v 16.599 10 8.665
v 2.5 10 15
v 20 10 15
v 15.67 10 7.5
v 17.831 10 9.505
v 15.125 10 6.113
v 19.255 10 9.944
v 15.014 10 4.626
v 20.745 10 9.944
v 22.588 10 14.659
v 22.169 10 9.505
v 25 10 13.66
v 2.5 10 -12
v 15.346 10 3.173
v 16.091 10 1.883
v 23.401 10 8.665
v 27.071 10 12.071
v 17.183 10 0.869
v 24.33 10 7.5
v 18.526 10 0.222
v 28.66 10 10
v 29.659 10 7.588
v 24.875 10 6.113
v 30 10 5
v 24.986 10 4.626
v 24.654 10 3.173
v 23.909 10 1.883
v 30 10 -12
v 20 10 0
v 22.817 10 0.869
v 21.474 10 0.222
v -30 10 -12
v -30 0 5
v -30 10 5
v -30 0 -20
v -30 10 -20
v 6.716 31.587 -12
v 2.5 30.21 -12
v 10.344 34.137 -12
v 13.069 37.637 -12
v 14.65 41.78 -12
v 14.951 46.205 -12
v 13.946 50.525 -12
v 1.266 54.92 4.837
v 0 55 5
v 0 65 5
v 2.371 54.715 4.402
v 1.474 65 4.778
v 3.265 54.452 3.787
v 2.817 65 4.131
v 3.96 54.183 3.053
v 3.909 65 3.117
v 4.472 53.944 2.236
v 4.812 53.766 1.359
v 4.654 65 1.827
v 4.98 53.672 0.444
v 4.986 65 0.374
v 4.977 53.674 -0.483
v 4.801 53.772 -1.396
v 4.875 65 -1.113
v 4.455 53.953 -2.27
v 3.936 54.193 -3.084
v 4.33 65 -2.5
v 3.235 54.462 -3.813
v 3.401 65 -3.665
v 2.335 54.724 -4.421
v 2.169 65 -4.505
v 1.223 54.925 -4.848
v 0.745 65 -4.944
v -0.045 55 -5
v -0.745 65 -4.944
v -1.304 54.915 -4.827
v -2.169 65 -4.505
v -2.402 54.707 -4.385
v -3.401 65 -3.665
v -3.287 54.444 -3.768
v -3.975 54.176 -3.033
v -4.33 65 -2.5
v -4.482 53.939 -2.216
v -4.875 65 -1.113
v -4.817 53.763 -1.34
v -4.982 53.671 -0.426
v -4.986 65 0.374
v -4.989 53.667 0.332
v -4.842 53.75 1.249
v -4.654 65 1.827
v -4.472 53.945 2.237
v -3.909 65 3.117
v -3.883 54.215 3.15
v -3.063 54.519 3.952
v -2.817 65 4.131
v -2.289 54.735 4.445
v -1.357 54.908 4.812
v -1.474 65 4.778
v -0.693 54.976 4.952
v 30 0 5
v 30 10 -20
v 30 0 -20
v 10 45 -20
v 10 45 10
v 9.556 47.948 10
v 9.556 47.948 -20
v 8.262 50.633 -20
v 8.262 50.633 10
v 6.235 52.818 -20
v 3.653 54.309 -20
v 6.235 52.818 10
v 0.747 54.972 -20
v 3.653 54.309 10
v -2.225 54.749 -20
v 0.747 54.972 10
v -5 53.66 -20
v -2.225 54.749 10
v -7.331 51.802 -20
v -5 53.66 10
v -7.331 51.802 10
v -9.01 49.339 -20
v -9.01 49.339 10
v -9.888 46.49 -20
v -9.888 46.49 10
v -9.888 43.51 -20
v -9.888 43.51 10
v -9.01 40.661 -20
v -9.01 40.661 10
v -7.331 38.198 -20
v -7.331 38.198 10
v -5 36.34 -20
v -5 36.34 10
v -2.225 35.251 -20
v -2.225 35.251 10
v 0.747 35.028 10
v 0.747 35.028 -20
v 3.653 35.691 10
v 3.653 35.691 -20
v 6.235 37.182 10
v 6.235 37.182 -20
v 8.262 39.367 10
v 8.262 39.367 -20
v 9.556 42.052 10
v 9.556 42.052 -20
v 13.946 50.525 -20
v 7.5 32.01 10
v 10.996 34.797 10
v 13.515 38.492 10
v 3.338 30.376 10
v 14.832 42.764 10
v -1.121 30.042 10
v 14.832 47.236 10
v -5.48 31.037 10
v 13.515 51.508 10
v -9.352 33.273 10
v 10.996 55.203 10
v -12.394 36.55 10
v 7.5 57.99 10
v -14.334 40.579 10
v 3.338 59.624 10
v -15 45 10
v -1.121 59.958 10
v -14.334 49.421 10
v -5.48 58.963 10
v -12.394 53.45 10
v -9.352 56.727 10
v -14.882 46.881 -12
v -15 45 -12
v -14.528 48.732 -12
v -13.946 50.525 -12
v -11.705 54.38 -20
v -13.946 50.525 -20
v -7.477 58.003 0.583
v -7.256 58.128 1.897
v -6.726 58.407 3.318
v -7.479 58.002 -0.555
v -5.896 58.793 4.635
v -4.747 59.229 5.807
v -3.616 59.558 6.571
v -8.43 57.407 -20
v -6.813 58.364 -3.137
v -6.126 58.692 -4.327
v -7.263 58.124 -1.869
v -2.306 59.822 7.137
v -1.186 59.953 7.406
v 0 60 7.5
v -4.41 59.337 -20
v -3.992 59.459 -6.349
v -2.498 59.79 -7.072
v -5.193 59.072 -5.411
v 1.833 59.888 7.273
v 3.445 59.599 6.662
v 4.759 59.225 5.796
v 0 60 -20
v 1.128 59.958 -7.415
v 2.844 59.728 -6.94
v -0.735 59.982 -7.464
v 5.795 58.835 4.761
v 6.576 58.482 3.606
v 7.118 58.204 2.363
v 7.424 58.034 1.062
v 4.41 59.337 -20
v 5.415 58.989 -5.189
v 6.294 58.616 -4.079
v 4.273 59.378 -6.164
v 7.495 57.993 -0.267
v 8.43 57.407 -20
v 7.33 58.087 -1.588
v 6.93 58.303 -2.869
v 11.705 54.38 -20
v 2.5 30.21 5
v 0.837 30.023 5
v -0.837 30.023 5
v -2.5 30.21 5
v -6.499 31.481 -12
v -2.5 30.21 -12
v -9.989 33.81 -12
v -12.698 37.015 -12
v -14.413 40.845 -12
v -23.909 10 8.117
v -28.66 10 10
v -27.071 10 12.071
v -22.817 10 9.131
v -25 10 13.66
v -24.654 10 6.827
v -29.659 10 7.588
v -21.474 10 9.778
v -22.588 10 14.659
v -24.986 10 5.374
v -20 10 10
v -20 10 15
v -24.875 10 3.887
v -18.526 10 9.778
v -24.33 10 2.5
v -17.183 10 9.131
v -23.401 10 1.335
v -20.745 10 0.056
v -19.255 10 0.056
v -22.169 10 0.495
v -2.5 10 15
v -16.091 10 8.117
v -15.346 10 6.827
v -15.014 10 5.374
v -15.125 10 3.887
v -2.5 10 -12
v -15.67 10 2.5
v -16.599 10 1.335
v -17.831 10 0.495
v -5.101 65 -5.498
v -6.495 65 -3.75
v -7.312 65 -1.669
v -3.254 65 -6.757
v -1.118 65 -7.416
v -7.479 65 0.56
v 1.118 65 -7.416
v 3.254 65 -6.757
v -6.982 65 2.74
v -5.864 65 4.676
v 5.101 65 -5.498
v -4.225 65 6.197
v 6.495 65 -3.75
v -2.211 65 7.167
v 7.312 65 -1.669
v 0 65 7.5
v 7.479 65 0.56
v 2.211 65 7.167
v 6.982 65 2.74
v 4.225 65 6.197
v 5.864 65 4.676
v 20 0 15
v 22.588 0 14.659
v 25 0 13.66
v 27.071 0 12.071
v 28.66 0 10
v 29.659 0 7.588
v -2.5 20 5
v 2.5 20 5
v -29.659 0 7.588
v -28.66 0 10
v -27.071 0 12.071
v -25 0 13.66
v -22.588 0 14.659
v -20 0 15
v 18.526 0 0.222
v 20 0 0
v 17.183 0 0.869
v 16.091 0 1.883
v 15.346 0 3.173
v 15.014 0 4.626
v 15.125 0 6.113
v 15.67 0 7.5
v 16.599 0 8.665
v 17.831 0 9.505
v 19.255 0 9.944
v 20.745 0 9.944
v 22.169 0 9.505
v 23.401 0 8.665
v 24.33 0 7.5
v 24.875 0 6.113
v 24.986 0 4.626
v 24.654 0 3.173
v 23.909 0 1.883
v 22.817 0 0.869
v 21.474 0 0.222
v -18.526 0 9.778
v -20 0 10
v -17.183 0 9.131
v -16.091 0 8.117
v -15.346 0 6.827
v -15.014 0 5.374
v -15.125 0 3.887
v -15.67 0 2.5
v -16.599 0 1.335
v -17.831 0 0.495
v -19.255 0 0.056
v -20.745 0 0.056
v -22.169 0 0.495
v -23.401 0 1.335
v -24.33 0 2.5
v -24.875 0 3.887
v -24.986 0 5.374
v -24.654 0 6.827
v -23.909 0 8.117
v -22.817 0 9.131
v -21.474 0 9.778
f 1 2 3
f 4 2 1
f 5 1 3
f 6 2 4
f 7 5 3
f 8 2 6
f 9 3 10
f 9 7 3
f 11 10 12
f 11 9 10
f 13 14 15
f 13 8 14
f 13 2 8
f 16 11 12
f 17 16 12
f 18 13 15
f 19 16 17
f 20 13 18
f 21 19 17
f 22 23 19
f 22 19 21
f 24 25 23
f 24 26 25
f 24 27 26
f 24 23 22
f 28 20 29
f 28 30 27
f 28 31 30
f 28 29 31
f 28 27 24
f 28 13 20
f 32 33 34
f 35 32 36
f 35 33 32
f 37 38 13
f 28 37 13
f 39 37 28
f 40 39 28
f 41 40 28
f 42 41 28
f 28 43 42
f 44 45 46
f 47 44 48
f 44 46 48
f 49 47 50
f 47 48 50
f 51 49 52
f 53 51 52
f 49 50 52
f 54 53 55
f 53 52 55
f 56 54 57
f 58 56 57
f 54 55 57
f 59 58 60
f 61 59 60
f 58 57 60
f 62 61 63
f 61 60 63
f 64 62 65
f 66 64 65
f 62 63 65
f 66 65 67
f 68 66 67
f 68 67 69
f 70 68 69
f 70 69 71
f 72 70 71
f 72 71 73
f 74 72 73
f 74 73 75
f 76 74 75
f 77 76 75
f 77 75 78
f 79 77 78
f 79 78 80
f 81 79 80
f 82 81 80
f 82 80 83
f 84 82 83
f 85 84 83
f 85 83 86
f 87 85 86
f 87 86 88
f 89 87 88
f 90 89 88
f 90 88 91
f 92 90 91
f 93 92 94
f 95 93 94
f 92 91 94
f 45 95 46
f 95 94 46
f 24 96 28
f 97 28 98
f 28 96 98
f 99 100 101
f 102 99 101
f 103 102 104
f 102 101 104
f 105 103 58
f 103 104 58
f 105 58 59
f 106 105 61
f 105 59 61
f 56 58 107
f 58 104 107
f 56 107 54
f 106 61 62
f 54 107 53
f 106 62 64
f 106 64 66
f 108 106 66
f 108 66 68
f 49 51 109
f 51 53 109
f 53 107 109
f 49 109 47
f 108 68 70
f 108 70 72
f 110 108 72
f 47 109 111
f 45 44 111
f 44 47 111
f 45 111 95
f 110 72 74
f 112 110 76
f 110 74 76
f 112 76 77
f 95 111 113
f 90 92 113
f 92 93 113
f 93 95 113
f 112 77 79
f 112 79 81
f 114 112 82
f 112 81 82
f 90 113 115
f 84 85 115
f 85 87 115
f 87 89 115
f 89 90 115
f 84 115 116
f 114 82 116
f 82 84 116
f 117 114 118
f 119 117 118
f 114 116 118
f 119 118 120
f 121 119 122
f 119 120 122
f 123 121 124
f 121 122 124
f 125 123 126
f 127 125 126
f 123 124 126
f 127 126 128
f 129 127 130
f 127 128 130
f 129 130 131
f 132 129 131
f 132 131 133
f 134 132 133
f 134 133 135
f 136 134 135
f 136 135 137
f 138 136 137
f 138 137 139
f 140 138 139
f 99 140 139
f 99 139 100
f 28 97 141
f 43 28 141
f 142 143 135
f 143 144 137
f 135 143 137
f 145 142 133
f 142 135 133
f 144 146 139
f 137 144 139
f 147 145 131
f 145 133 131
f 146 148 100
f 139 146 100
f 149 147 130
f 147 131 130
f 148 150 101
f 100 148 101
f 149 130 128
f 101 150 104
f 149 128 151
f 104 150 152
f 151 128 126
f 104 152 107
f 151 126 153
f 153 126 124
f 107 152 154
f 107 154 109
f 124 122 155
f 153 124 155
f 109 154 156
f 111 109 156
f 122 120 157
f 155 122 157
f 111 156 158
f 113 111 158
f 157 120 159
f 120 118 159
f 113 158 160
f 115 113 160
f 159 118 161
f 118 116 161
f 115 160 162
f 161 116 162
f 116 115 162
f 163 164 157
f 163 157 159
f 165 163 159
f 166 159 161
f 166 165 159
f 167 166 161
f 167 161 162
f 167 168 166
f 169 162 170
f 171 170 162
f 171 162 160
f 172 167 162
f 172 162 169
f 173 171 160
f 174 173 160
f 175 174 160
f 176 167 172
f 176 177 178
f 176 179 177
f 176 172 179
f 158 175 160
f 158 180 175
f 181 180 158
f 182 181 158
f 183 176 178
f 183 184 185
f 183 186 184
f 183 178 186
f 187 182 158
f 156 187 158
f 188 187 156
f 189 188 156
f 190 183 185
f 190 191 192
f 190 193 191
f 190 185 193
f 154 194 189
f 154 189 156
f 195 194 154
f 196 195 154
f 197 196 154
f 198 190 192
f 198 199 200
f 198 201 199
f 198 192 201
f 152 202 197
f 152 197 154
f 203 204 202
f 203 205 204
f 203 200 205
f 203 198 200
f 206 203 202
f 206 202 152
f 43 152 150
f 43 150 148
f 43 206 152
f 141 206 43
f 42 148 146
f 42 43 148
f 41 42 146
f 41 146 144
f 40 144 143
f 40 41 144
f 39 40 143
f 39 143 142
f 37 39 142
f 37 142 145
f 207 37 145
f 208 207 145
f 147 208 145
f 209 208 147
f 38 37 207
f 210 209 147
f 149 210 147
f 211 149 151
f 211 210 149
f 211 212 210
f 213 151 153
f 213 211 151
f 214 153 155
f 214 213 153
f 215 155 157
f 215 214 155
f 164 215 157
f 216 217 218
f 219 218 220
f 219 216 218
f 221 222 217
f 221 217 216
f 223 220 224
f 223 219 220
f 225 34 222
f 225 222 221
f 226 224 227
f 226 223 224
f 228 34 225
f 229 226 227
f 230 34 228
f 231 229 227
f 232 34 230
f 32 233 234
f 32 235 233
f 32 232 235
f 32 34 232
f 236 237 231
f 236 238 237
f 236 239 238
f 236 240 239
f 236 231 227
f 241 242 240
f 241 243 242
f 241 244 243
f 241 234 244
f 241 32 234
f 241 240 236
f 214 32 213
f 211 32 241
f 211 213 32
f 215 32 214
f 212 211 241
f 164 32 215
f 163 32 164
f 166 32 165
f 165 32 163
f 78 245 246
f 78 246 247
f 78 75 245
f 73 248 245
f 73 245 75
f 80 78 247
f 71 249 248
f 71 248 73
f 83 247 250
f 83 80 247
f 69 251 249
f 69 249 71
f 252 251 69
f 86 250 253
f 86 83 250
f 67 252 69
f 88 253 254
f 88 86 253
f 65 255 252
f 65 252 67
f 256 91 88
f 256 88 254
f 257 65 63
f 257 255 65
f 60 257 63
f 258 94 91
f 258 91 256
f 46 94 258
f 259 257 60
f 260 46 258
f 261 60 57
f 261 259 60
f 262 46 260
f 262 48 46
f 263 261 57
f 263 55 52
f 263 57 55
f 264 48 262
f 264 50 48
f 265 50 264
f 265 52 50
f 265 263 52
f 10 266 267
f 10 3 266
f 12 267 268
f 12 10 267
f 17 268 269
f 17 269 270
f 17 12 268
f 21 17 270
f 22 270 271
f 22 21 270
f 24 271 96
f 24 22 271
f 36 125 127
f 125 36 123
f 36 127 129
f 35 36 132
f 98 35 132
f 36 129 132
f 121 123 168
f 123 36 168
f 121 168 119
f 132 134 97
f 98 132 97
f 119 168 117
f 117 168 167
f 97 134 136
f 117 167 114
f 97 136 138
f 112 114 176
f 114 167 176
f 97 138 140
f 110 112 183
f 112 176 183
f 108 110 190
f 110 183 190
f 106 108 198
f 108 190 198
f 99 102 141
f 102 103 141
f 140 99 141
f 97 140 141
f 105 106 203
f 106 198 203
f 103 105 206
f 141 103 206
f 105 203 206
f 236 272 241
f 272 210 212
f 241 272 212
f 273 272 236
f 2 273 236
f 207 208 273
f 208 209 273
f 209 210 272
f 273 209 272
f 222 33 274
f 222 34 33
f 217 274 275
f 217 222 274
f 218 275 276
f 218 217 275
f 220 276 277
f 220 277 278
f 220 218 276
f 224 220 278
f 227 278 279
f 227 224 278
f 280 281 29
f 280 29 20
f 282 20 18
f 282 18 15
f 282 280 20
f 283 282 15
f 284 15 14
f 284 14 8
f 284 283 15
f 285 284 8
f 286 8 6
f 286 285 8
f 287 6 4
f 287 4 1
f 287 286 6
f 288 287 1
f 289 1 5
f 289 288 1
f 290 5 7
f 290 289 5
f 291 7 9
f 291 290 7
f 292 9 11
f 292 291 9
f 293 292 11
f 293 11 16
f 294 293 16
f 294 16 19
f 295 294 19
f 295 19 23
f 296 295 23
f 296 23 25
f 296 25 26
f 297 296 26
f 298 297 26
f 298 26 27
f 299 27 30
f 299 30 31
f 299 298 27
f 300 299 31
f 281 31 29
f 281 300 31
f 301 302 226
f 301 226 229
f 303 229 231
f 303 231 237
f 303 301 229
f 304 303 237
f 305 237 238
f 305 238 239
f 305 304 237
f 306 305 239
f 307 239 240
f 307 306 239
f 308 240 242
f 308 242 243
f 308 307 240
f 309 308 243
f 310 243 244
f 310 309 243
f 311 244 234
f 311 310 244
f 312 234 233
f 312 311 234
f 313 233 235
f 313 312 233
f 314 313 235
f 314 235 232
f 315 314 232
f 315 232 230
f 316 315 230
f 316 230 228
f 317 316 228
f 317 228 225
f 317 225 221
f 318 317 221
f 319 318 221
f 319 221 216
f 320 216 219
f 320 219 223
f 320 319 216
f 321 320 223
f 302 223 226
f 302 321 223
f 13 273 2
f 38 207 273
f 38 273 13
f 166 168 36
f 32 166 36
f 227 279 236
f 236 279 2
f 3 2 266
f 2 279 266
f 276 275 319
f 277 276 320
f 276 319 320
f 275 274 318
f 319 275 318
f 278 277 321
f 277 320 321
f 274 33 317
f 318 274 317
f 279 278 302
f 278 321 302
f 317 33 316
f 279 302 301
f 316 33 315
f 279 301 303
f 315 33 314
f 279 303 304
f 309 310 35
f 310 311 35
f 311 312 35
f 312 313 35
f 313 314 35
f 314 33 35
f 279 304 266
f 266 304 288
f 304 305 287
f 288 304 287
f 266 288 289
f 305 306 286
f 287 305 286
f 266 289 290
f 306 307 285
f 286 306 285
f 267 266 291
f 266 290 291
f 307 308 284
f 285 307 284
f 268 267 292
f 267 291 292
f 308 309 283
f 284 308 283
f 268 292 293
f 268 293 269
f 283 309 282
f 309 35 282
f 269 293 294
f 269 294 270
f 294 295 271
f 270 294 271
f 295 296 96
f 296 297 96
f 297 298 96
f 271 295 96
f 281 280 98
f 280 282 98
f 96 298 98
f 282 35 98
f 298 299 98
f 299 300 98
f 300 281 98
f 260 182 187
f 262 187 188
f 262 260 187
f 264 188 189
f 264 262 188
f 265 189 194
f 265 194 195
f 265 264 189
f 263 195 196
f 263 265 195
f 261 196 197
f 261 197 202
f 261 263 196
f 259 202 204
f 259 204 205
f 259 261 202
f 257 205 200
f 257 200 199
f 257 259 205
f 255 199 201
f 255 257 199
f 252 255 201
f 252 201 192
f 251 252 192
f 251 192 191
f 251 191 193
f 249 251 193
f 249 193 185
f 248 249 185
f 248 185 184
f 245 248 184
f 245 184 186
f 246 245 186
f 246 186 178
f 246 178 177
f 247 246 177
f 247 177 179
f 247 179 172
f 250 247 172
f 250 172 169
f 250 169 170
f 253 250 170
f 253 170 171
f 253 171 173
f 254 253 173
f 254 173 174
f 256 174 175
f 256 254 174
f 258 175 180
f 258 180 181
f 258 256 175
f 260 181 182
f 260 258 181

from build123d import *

# Parameters (mm, degrees)
SKETCH_4_W               = 60
SKETCH_4_H               = 35
SKETCH_4_R               = 5
EXTRUDE_1_DEPTH          = 10
FILLET_1_R               = 10
FILLET_2_R               = 10
EXTRUDE_2_DEPTH          = 8
SKETCH_6_R               = 15
EXTRUDE_3_DEPTH          = 30
SKETCH_8_R               = 10
CUT_EXTRUDE_1_DEPTH      = 74.484692283
EXTRUDE_4_REACH          = 76.33
EXTRUDE_4_END_RADIUS     = 15
SKETCH_9_R               = 7.5
CUT_EXTRUDE_2_REACH      = 76.33
CUT_EXTRUDE_2_END_RADIUS = 10
SKETCH_10_R              = 5
RIB_START                = -2.5
RIB_1_DEPTH              = 5


# Read off the part's stored shape, not the designer's step: 筋1
with BuildPart() as part:
    # 草图4 → 凸台-拉伸1 (new body)
    with BuildSketch(Plane(origin=(0, 0, 0), x_dir=(1, 0, 0), z_dir=(0, 1, 0))):
        with Locations((0, 2.5)):
            Rectangle(SKETCH_4_W, SKETCH_4_H)
        with Locations(Location((-20, -5, 0), (0, 0, 270))):
            Circle(SKETCH_4_R, mode=Mode.SUBTRACT)
        with Locations(Location((20, -5, 0), (0, 0, 90))):
            Circle(SKETCH_4_R, mode=Mode.SUBTRACT)
    extrude(amount=EXTRUDE_1_DEPTH)

    # 圆角1
    fillet_1_edges = [part.edges().sort_by_distance(p)[0] for p in [
        (-30, 5, 15),
    ]]
    fillet(fillet_1_edges, radius=FILLET_1_R)

    # 圆角2
    fillet_2_edges = [part.edges().sort_by_distance(p)[0] for p in [
        (30, 5, 15),
    ]]
    fillet(fillet_2_edges, radius=FILLET_2_R)

    # 草图5 → 凸台-拉伸2 (add)
    with BuildSketch(Plane(origin=(0, 0, -20), x_dir=(-1, 0, 0), z_dir=(0, 0, -1))):
        with BuildLine():
            Line((-30, 10), (-13.945515037, 50.524727174))
            ThreePointArc((-13.945515037, 50.524727174), (0, 60), (13.945515037, 50.524727174))
            Line((13.945515037, 50.524727174), (30, 10))
            Line((30, 10), (-30, 10))
        make_face()
    extrude(amount=-EXTRUDE_2_DEPTH)

    # 草图6 → 凸台-拉伸3 (add)
    with BuildSketch(Plane(origin=(0, 0, -20), x_dir=(-1, 0, 0), z_dir=(0, 0, -1))):
        with Locations((0, 45)):
            Circle(SKETCH_6_R)
    extrude(amount=-EXTRUDE_3_DEPTH)

    # 草图8 → 切除-拉伸1 (cut, through all)
    with BuildSketch(Plane.XY.offset(10)):
        with Locations((0, 45)):
            Circle(SKETCH_8_R)
    extrude(amount=-CUT_EXTRUDE_1_DEPTH, mode=Mode.SUBTRACT)

    # 凸台-拉伸4: up to this cylinder (the profile starts outside it)
    extrude_4_end = Plane(origin=(0, 45, 0), z_dir=(0, 0, -1)) * Cylinder(EXTRUDE_4_END_RADIUS, 183.66, mode=Mode.PRIVATE)
    # 草图9 → 凸台-拉伸4 (add, up to the surface)
    with BuildSketch(Plane(origin=(0, 65, 0), x_dir=(1, 0, 0), z_dir=(0, 1, 0)), mode=Mode.PRIVATE) as extrude_4_sk1:
        with Locations(Location((0, 0, 0), (0, 0, 270))):
            Circle(SKETCH_9_R)
    extrude_4_tool1 = extrude(extrude_4_sk1.sketch, amount=-EXTRUDE_4_REACH, mode=Mode.PRIVATE) - extrude_4_end
    add(extrude_4_tool1.solids().sort_by_distance((0, 65, 0))[0])

    # 切除-拉伸2: up to this cylinder (the profile starts outside it)
    cut_extrude_2_end = Plane(origin=(0, 45, 0), z_dir=(0, 0, 1)) * Cylinder(CUT_EXTRUDE_2_END_RADIUS, 173.66, mode=Mode.PRIVATE)
    # 草图10 → 切除-拉伸2 (cut, up to the surface)
    with BuildSketch(Plane(origin=(0, 65, 0), x_dir=(1, 0, 0), z_dir=(0, 1, 0)), mode=Mode.PRIVATE) as cut_extrude_2_sk1:
        with Locations(Location((0, 0, 0), (0, 0, 270))):
            Circle(SKETCH_10_R)
    cut_extrude_2_tool1 = extrude(cut_extrude_2_sk1.sketch, amount=-CUT_EXTRUDE_2_REACH, mode=Mode.PRIVATE) - cut_extrude_2_end
    add(cut_extrude_2_tool1.solids().sort_by_distance((0, 65, 0))[0], mode=Mode.SUBTRACT)

    # 筋1 outline → 筋1 (add)
    with BuildSketch(Plane(origin=(0, 0, 0), x_dir=(0, 0, -1), z_dir=(1, 0, 0)).offset(RIB_START)):
        Polygon((-5, 32), (-5, 20), (-15, 10), (12, 10), (12, 32), align=None)
    extrude(amount=RIB_1_DEPTH)


solid = part.part
